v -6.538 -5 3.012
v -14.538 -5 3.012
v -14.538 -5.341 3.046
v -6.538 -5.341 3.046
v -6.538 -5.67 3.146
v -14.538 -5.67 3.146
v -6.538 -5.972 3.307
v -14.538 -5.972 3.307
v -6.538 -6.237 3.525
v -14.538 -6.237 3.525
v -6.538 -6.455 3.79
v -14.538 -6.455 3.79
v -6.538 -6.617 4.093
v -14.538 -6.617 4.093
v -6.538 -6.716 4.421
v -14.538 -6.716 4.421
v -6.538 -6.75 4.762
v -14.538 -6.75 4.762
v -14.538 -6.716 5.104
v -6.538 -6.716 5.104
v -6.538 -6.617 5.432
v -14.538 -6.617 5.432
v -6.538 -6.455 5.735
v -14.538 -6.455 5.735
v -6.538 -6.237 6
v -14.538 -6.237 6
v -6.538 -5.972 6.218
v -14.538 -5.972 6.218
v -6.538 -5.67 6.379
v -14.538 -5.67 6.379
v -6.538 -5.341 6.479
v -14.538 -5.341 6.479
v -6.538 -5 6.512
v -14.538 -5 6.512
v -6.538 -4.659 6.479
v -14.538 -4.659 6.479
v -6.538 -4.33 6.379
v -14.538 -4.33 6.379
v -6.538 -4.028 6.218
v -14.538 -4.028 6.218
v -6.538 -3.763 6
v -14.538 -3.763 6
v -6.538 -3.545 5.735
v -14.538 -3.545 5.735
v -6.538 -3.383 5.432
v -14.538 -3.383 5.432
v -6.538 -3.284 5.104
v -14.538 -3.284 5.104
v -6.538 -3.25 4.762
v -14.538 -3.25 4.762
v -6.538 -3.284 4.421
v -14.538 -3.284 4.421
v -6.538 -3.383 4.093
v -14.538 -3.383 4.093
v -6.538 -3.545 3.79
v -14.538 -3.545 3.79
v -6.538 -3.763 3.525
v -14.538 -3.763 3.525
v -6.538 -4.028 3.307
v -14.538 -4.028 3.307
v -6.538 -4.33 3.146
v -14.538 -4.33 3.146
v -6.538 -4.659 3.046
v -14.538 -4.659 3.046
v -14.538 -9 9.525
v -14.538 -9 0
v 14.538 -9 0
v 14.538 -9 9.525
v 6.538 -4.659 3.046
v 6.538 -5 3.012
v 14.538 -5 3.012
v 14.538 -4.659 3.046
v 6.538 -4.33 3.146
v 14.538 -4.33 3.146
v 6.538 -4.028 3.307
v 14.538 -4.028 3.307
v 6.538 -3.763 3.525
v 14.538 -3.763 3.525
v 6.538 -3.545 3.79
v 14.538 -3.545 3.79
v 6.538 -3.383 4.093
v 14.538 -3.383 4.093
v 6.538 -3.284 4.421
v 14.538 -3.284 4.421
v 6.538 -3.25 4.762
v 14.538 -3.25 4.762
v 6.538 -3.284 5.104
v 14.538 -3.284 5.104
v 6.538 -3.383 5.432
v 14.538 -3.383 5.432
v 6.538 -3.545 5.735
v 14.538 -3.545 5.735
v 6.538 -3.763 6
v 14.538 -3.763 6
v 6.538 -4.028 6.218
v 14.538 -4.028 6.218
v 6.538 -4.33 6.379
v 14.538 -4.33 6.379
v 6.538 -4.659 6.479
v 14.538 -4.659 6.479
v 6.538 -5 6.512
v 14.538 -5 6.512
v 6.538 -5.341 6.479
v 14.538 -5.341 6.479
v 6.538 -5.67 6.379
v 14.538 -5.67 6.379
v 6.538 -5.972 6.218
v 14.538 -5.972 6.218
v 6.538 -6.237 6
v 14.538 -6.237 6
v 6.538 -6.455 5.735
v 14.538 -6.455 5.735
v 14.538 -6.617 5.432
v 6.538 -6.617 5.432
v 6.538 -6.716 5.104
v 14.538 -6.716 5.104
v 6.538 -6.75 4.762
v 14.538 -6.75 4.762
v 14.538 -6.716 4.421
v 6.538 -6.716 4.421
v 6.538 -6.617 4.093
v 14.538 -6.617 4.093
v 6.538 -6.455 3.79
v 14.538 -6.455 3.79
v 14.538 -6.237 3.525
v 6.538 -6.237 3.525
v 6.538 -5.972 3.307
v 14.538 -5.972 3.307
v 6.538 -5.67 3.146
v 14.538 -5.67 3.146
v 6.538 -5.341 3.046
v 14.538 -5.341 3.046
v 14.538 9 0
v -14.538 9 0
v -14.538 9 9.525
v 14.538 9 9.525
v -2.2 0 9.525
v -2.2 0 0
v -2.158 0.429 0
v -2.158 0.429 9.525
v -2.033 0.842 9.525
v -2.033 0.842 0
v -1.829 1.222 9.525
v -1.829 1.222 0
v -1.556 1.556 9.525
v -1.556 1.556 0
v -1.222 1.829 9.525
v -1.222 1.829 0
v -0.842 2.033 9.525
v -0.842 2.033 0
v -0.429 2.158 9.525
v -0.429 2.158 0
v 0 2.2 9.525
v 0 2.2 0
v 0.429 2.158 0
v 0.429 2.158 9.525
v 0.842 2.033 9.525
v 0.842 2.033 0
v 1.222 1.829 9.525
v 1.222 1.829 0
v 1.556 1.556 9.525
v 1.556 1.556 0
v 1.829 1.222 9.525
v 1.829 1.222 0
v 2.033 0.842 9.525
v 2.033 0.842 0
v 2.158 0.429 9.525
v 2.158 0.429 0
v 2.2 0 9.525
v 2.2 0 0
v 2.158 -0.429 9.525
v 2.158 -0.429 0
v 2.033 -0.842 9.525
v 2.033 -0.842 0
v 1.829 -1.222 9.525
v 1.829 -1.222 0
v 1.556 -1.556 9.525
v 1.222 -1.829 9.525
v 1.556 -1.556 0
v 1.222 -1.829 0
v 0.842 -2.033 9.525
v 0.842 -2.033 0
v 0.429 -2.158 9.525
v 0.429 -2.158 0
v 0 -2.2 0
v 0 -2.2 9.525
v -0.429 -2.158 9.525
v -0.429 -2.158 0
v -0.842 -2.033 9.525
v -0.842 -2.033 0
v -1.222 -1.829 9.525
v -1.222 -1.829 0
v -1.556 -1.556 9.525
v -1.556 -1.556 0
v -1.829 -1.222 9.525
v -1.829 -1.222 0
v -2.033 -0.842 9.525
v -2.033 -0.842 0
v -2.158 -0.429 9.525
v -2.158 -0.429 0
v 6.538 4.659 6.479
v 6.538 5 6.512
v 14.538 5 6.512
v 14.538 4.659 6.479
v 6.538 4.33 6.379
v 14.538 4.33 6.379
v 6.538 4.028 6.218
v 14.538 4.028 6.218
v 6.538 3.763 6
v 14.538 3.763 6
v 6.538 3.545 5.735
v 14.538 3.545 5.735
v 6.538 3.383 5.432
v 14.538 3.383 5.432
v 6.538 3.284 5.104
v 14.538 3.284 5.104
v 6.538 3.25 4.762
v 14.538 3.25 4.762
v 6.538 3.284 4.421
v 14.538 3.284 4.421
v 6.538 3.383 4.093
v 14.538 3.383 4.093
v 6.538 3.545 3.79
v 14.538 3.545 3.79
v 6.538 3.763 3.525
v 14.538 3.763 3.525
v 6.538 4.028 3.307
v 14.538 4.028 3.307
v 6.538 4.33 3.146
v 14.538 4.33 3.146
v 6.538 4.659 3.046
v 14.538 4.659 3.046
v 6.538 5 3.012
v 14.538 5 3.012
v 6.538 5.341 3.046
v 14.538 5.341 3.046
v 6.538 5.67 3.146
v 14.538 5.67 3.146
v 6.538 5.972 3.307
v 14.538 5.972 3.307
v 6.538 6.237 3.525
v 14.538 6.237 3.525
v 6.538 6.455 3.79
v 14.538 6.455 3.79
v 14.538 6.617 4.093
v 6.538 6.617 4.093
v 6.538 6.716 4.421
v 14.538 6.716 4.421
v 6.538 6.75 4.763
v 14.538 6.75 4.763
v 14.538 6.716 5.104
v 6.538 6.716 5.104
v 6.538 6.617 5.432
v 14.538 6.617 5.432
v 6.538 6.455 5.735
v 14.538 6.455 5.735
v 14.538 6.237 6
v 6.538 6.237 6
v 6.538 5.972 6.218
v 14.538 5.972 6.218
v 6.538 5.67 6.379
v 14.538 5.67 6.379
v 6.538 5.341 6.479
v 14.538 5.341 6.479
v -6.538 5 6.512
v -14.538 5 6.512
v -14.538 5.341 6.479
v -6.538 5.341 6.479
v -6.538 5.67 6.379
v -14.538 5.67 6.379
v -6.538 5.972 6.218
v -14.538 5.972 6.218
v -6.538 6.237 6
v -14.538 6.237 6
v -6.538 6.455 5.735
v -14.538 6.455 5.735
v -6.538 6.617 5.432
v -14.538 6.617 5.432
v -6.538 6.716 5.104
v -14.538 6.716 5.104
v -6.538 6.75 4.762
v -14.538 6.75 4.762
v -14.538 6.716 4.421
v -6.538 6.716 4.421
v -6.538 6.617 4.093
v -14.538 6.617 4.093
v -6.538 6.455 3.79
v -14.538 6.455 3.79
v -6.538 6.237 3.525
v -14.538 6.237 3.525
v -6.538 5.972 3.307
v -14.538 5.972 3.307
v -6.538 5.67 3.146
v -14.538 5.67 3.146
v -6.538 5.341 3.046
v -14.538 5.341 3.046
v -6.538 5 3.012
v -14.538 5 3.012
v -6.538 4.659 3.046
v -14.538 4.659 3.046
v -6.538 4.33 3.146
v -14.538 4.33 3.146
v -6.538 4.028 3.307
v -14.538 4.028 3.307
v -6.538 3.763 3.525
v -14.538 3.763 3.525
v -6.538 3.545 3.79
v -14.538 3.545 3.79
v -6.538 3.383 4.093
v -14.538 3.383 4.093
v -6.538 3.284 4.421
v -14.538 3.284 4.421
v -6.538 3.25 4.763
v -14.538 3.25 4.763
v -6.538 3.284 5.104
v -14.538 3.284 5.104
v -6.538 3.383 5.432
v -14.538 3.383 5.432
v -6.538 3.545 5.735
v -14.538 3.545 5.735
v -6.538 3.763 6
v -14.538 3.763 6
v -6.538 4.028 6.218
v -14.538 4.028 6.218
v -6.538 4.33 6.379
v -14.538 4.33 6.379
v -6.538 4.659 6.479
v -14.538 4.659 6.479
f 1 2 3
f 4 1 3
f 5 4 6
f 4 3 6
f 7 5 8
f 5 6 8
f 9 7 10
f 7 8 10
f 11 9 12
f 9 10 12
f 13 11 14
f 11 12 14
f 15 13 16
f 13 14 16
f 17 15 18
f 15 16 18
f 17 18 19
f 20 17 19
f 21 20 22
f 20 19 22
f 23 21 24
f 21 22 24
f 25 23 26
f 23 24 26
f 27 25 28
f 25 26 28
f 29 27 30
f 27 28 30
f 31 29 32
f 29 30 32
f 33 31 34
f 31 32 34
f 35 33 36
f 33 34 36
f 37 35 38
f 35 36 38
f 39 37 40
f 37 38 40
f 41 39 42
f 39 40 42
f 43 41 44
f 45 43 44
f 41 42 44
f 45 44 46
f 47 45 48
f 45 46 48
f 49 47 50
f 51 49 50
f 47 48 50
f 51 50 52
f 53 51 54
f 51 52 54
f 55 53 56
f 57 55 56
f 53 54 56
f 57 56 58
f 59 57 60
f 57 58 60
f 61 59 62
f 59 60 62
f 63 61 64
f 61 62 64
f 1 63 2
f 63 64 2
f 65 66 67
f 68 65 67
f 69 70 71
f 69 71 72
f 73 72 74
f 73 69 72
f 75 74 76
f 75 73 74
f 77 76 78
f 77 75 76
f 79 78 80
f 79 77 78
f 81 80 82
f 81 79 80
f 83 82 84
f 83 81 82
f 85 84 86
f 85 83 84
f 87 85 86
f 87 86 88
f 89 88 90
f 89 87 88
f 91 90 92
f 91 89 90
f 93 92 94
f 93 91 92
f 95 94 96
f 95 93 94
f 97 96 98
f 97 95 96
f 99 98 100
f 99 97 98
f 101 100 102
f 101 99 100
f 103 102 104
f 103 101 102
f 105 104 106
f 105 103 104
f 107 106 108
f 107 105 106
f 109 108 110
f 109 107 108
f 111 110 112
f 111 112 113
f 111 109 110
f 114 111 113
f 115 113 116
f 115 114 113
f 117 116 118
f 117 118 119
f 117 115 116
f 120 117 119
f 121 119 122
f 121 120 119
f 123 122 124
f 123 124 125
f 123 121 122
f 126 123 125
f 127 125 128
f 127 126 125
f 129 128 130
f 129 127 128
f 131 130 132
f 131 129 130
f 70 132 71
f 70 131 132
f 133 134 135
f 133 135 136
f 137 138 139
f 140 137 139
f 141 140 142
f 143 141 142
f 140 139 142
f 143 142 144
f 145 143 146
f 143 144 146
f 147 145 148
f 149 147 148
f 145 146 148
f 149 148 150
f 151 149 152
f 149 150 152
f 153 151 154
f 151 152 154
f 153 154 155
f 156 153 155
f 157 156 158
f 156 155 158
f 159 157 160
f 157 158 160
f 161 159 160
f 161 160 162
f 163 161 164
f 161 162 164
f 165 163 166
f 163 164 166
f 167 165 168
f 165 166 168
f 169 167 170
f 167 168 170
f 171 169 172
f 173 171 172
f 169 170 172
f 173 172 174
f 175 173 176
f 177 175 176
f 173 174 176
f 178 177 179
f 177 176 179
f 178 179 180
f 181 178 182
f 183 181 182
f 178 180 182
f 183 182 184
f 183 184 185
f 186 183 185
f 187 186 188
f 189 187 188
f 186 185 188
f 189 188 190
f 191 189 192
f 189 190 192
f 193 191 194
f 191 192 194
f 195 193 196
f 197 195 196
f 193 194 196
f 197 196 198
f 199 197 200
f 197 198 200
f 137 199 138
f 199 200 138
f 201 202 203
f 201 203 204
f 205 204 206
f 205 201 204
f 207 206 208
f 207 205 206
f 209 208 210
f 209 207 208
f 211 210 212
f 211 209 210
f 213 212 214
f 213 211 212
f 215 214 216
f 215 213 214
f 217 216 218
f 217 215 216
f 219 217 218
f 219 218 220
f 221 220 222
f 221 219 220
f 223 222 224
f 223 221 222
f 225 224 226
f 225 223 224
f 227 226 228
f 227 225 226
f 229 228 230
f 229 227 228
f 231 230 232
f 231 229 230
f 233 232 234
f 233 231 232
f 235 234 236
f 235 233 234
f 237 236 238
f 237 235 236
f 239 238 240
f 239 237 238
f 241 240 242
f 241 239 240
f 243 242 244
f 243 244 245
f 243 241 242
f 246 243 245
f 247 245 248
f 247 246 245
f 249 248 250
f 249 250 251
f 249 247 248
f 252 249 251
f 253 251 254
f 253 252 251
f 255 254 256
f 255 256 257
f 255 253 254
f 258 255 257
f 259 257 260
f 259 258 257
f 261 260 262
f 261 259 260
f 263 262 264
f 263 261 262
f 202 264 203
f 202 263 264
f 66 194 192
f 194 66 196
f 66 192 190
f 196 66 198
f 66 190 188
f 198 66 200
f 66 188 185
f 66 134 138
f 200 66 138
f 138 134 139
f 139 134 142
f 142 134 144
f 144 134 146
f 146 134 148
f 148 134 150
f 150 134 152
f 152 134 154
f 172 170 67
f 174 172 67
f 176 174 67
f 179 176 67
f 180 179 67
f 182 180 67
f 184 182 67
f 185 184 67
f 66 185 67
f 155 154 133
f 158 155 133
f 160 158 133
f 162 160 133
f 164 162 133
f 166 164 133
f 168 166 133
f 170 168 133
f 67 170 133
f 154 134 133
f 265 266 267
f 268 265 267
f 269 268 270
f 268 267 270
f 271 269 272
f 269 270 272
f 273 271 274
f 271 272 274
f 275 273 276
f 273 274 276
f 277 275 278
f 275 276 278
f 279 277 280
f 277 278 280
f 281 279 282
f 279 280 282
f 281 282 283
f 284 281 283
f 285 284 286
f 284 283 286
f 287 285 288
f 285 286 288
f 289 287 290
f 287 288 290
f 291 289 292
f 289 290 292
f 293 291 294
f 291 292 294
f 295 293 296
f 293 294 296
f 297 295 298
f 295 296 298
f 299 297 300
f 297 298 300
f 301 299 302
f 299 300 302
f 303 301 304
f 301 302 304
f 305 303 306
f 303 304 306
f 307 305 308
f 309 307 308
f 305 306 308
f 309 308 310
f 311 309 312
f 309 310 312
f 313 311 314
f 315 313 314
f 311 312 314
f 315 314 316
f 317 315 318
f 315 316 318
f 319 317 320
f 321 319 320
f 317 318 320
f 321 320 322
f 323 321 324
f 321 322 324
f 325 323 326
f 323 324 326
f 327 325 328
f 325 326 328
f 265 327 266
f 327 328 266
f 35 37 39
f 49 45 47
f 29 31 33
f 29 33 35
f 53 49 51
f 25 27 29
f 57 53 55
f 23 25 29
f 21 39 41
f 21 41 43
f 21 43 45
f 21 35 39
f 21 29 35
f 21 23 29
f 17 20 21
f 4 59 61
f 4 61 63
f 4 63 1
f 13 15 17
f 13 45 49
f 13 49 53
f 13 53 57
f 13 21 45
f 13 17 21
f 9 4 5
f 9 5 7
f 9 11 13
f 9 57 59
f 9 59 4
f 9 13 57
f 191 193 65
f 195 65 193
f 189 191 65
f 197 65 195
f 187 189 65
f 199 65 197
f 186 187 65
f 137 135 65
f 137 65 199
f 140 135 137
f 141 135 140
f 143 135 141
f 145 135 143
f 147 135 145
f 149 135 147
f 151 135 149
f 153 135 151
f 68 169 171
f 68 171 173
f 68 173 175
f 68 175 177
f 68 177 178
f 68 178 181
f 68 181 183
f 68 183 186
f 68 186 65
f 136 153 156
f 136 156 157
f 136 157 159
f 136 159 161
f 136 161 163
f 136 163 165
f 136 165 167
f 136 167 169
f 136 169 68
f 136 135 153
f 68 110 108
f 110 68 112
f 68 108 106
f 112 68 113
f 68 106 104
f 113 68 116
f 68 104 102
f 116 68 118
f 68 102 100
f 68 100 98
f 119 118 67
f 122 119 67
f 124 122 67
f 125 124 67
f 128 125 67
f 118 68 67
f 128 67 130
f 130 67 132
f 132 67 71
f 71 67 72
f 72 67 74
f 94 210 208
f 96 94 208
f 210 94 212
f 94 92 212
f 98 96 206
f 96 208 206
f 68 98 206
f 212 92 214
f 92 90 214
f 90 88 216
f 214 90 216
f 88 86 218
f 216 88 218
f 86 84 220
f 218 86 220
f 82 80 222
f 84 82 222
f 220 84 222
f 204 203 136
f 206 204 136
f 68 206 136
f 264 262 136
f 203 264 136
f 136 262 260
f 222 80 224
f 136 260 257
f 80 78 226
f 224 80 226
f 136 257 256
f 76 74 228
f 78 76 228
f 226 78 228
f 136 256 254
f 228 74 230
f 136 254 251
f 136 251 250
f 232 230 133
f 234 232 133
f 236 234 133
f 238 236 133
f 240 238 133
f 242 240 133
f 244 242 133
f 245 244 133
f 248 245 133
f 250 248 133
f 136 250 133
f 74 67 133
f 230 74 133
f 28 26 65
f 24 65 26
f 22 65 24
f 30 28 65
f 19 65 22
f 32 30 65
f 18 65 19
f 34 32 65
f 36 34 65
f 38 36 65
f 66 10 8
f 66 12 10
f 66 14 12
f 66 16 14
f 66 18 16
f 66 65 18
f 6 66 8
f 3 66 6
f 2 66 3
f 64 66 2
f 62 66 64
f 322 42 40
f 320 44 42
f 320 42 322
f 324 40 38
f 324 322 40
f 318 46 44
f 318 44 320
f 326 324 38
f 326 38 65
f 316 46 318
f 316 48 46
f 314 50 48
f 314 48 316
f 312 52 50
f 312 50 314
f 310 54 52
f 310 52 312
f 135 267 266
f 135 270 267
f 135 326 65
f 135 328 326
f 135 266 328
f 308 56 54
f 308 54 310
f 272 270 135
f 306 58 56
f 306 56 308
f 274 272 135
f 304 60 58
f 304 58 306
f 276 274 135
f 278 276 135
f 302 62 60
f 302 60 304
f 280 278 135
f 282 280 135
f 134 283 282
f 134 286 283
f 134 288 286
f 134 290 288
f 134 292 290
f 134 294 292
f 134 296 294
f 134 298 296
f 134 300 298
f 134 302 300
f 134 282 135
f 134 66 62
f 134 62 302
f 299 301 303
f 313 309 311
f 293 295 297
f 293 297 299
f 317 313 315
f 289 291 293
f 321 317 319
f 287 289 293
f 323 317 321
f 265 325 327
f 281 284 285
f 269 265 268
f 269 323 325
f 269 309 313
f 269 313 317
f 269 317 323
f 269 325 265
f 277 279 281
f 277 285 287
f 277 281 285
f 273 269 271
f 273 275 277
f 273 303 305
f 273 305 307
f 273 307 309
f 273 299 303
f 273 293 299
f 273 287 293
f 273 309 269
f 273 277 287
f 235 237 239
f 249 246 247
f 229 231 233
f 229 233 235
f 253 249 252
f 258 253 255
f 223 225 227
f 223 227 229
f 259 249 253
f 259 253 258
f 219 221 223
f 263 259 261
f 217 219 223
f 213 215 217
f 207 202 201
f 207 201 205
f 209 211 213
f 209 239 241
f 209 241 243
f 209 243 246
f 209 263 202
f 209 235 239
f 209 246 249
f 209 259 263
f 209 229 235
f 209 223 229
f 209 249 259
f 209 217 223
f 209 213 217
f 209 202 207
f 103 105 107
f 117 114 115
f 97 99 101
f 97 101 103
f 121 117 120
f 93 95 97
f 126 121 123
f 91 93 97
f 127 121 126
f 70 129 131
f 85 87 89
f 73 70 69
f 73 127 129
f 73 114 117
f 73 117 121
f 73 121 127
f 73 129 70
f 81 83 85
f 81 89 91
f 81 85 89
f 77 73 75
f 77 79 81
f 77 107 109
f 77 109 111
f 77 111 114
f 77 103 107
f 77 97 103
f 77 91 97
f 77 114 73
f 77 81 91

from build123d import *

# Parameters (mm, degrees)
SKETCH1_W         = 29.075
SKETCH1_H         = 18
EXTRUDE_3_8_DEPTH = 9.525
SKETCH2_R         = 1.75
M4_DRILL_DEPTH    = 8
M4_DRILL2_START   = -8
SKETCH3_R         = 1.75
M4_DRILL2_DEPTH   = 8
SKETCH5_R         = 2.2
M5_DRILL_DEPTH    = 9.525


with BuildPart() as part:
    # Sketch1 → 3/8 (new body)
    with BuildSketch(Plane.XY):
        Rectangle(SKETCH1_W, SKETCH1_H)
    extrude(amount=EXTRUDE_3_8_DEPTH)

    # Sketch2 → M4_DRILL (cut)
    with BuildSketch(Plane.ZY.offset(14.5375)):
        with Locations((4.7625, 5)):
            Circle(SKETCH2_R)
        with Locations(Location((4.7625, -5, 0), (0, 0, 180))):
            Circle(SKETCH2_R)
    extrude(amount=-M4_DRILL_DEPTH, mode=Mode.SUBTRACT)

    # Sketch3 → M4_DRILL2 (cut)
    with BuildSketch(Plane(origin=(14.5375, 0, 0), x_dir=(0, 0, -1), z_dir=(1, 0, 0)).offset(M4_DRILL2_START)):
        with Locations((-4.7625, -5)):
            Circle(SKETCH3_R)
        with Locations(Location((-4.7625, 5, 0), (0, 0, 180))):
            Circle(SKETCH3_R)
    extrude(amount=M4_DRILL2_DEPTH, mode=Mode.SUBTRACT)

    # Sketch5 → M5_DRILL (cut)
    with BuildSketch(Plane(origin=(0, 0, 0), x_dir=(-1, 0, 0), z_dir=(0, 0, -1))):
        Circle(SKETCH5_R)
    extrude(amount=-M5_DRILL_DEPTH, mode=Mode.SUBTRACT)


solid = part.part
